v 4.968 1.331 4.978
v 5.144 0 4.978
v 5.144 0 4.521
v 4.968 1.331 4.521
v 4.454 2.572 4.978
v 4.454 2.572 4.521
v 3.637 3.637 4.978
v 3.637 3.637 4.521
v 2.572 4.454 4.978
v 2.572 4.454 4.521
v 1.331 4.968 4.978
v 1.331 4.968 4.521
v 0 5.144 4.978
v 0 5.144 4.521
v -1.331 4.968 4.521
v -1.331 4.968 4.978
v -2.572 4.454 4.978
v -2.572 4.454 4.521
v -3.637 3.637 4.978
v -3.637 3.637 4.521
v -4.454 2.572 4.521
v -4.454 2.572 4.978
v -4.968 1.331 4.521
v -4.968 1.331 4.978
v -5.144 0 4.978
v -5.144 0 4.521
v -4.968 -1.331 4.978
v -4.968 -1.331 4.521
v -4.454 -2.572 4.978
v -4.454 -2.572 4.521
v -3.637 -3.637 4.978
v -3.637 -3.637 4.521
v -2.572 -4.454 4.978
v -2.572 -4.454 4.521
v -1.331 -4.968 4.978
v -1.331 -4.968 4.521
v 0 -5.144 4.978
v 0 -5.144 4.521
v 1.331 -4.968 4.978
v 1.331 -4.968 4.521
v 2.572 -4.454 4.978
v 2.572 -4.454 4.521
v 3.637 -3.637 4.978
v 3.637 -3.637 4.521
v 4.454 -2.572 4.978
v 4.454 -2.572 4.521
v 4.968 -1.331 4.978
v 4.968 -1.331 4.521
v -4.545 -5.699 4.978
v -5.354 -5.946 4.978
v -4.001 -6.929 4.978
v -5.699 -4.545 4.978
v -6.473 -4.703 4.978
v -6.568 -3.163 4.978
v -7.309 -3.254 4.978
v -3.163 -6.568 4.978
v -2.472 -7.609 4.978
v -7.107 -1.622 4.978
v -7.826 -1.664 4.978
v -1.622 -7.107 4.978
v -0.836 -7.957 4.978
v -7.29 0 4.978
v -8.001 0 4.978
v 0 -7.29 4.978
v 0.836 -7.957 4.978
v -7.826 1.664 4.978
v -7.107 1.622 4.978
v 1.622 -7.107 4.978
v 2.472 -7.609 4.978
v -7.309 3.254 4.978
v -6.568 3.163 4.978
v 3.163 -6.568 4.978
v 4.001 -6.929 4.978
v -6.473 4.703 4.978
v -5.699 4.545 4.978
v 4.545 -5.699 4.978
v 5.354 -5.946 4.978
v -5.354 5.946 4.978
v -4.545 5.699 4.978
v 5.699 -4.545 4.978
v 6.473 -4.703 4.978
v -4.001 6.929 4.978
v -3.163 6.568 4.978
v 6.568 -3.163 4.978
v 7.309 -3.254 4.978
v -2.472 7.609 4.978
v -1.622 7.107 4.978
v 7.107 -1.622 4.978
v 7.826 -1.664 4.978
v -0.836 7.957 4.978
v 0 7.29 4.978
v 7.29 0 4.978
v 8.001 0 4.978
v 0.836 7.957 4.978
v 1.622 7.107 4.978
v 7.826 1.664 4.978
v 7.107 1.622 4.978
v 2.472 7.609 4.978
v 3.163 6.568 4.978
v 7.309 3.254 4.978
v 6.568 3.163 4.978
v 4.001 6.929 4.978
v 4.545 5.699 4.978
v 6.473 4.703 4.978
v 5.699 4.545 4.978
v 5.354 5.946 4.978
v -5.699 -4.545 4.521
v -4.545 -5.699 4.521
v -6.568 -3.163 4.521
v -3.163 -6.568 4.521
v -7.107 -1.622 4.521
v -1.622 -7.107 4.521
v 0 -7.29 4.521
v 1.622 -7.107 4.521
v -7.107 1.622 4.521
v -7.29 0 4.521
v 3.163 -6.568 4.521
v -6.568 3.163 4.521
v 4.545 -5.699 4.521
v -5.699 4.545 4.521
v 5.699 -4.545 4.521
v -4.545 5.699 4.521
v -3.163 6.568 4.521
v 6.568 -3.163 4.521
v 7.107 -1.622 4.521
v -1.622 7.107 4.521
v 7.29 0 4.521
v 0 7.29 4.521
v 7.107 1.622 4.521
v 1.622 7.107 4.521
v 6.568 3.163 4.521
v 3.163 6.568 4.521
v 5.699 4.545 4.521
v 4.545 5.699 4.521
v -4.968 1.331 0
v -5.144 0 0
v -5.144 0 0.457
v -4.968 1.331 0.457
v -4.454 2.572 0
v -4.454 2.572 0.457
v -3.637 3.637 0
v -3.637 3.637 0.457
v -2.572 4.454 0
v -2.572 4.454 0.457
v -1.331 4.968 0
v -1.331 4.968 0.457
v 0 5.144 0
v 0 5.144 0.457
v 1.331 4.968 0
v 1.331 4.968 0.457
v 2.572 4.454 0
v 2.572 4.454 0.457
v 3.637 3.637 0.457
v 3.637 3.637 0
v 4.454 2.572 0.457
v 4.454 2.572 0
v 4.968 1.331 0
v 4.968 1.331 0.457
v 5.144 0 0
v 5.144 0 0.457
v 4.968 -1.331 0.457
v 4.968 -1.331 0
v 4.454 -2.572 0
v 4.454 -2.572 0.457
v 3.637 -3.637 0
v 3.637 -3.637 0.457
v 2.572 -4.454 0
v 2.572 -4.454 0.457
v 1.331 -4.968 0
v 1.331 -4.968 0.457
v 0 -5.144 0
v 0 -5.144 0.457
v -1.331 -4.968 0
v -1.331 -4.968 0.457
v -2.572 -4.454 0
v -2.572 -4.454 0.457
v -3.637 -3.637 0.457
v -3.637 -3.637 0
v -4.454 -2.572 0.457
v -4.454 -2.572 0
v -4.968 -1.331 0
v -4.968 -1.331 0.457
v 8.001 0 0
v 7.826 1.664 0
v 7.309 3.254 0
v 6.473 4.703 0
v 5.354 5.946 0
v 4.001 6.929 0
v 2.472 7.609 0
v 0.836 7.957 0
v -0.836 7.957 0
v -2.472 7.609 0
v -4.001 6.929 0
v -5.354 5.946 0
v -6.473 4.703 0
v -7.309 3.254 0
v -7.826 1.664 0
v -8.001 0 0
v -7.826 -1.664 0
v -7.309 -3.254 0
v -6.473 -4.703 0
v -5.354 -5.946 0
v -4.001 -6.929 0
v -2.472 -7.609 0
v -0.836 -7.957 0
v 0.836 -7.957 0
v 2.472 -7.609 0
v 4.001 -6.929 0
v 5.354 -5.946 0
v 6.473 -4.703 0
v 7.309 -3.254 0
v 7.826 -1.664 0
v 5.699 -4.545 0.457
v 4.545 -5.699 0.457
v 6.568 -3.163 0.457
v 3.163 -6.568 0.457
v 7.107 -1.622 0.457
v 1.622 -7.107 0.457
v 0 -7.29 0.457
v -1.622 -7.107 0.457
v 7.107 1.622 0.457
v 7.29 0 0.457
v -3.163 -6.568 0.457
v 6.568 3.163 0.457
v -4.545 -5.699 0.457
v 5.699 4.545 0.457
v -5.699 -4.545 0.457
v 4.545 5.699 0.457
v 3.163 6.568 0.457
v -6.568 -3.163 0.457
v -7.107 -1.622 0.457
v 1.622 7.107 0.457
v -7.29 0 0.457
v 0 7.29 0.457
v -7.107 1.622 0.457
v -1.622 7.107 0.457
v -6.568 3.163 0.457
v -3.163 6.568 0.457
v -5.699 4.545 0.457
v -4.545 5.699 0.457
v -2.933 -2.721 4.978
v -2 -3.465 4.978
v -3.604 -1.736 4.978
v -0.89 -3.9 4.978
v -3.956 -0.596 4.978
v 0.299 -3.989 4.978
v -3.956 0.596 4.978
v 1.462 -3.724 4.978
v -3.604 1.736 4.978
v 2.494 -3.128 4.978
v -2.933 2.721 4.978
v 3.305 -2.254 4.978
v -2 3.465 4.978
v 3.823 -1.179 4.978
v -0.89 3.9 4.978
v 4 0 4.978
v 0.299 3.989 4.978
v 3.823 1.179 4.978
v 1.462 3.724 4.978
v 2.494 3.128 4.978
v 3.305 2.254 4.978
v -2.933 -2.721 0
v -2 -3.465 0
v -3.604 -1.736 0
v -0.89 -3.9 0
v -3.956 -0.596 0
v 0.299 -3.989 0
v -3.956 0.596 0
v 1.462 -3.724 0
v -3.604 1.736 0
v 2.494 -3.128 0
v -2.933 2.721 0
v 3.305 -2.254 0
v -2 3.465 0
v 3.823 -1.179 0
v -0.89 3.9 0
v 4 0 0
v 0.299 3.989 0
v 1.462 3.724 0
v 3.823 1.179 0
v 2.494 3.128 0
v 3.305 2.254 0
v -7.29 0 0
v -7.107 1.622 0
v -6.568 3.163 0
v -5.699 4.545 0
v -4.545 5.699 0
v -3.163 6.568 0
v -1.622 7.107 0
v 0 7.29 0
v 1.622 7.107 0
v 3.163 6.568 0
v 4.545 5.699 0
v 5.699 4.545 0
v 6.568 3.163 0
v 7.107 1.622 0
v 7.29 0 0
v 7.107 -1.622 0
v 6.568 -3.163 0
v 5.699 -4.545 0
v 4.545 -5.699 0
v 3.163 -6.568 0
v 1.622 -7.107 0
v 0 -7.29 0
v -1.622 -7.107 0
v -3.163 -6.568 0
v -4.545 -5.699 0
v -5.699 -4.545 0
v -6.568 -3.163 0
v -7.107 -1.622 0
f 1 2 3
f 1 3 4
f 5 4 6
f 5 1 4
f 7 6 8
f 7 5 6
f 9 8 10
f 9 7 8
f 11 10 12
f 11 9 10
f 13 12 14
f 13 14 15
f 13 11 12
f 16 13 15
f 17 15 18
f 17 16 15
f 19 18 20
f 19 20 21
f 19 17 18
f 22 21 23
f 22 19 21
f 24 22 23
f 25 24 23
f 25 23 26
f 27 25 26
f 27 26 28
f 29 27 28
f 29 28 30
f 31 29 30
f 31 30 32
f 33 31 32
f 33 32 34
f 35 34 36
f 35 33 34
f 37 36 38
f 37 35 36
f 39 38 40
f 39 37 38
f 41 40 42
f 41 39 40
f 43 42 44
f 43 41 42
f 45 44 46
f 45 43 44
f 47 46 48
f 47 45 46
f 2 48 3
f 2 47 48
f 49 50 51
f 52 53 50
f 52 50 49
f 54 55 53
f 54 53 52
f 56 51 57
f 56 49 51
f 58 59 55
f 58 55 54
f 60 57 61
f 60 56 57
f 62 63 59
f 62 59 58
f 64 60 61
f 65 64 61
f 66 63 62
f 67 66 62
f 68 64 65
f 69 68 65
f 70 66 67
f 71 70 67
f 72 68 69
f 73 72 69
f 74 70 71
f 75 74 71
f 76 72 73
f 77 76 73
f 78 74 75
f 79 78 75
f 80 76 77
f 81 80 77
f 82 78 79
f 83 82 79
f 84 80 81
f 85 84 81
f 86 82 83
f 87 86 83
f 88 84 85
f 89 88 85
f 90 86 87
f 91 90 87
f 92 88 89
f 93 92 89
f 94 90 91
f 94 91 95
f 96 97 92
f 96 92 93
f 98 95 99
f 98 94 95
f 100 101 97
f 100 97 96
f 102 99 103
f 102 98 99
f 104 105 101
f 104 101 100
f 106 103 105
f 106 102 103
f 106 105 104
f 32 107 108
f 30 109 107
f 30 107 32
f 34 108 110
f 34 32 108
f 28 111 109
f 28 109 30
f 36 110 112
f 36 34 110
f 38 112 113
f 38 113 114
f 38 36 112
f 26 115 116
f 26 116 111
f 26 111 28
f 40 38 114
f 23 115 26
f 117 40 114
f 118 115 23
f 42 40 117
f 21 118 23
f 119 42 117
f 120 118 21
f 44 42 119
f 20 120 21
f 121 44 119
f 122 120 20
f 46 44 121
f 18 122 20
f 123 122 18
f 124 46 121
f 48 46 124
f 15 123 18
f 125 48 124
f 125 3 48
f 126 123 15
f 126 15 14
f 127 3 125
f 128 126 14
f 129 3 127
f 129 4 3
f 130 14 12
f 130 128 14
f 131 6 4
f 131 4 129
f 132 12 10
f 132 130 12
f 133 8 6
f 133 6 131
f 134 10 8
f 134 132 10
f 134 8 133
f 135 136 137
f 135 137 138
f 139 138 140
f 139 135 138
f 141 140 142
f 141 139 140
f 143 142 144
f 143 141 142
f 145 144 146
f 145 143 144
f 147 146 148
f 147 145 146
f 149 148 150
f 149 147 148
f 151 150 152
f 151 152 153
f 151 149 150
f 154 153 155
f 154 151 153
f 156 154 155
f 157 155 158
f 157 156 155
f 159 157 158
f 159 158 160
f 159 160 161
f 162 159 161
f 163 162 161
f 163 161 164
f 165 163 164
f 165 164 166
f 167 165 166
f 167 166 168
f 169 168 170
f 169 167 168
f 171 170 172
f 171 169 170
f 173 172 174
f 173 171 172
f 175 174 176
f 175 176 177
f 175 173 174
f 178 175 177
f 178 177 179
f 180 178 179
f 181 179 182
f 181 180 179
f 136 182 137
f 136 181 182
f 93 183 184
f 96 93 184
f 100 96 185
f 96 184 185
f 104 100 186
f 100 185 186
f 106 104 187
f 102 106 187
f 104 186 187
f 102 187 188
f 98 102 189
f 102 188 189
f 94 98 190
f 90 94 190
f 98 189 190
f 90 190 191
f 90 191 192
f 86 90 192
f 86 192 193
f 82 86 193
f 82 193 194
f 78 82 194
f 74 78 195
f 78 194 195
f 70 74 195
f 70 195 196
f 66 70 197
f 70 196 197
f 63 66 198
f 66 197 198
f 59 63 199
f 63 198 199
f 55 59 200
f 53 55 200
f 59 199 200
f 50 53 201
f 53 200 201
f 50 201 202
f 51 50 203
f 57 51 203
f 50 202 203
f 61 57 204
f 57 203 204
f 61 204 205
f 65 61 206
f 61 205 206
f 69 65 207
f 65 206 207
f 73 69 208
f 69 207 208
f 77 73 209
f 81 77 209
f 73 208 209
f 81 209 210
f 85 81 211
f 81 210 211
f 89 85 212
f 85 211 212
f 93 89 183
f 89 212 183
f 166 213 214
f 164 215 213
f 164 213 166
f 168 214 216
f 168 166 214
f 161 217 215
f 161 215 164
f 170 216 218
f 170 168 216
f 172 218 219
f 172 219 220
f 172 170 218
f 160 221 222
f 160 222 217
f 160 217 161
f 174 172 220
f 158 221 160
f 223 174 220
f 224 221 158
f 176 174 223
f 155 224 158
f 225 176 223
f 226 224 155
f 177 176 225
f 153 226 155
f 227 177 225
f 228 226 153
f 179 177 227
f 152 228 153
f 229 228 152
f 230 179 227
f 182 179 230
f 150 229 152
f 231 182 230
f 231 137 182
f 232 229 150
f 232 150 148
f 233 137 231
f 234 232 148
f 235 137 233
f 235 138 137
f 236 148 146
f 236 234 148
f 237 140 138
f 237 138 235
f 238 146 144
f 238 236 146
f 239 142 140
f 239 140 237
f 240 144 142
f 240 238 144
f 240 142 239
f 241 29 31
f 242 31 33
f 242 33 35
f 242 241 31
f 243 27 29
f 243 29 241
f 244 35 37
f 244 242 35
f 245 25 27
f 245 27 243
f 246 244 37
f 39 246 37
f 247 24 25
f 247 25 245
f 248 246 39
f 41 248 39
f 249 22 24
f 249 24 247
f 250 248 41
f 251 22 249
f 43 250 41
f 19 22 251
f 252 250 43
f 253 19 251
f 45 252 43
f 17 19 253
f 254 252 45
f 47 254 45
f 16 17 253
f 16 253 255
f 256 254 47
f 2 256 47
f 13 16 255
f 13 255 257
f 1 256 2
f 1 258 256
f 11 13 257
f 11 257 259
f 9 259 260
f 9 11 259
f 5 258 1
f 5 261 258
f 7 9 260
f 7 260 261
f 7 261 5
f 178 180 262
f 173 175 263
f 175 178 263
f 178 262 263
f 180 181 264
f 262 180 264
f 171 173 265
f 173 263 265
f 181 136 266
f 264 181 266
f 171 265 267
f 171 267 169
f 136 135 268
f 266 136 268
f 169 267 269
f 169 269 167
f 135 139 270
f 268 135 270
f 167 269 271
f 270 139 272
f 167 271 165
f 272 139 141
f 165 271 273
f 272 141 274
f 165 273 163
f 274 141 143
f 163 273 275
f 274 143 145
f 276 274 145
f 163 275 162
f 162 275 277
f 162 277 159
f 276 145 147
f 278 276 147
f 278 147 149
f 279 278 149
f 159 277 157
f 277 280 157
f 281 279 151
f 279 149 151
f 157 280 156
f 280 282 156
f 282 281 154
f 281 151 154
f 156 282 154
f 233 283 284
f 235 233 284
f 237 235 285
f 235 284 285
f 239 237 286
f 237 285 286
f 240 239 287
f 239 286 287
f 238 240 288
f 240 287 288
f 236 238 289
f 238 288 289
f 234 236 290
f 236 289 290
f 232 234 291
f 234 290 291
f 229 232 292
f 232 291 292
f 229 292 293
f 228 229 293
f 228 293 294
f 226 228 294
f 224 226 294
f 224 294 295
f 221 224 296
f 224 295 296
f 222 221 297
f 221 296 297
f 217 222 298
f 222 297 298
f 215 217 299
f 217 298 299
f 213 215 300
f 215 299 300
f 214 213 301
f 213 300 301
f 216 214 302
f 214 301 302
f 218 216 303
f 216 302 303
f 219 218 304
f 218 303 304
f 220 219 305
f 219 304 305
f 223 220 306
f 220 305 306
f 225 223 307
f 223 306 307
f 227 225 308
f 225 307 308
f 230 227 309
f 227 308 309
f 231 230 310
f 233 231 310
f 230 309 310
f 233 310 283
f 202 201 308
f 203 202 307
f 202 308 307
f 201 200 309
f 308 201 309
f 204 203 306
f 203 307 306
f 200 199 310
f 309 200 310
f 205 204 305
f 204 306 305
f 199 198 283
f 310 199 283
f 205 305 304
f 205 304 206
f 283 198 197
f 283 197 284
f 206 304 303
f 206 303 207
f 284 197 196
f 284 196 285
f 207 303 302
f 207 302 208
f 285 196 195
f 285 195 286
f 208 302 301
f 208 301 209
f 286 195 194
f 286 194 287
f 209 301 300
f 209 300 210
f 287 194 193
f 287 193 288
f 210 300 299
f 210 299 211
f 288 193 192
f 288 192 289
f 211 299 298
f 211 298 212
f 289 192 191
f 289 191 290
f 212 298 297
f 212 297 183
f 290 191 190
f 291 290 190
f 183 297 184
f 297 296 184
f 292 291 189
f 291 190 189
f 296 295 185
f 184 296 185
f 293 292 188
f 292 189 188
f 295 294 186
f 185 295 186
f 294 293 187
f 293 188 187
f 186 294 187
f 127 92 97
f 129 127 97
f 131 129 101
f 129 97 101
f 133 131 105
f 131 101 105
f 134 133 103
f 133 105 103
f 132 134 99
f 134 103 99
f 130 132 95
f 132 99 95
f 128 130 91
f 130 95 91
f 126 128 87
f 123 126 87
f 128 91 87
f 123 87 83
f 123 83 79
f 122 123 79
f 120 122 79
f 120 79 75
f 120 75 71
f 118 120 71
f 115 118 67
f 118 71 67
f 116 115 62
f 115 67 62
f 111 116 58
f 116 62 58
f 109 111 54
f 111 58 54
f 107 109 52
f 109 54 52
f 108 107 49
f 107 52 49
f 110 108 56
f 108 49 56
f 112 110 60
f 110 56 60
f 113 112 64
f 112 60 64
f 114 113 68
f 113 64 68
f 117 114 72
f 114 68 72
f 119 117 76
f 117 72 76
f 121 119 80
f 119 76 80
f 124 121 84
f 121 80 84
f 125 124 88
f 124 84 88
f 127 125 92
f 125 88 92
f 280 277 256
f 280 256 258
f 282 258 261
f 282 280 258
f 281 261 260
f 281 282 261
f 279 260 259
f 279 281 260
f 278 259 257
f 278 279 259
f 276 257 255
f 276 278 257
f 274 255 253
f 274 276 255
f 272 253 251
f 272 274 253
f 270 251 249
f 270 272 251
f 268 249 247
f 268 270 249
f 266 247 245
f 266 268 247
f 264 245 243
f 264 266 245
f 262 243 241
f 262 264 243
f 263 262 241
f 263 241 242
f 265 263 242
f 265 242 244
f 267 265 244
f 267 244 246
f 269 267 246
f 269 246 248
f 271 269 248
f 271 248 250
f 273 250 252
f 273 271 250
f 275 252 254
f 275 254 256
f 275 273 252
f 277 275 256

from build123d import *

# Parameters (mm, degrees)
SKETCH1_R           = 8.001
SKETCH1_R_2         = 4.0005
BOSS_EXTRUDE1_DEPTH = 4.9784
SKETCH2_R           = 7.2898
SKETCH2_R_2         = 5.1435
CUT_EXTRUDE1_DEPTH  = 0.4572
CUT_EXTRUDE2_START  = -0.4572
SKETCH3_R           = 7.2898
SKETCH3_R_2         = 5.1435
CUT_EXTRUDE2_DEPTH  = 0.4572


with BuildPart() as part:
    # Sketch1 → Boss-Extrude1 (new body)
    with BuildSketch(Plane.XY):
        Circle(SKETCH1_R)
        Circle(SKETCH1_R_2, mode=Mode.SUBTRACT)
    extrude(amount=BOSS_EXTRUDE1_DEPTH)

    # Sketch2 → Cut-Extrude1 (cut)
    with BuildSketch(Plane.XY.offset(4.9784)):
        Circle(SKETCH2_R)
        Circle(SKETCH2_R_2, mode=Mode.SUBTRACT)
    extrude(amount=-CUT_EXTRUDE1_DEPTH, mode=Mode.SUBTRACT)

    # Sketch3 → Cut-Extrude2 (cut)
    with BuildSketch(Plane(origin=(0, 0, 0), x_dir=(-1, 0, 0), z_dir=(0, 0, -1)).offset(CUT_EXTRUDE2_START)):
        Circle(SKETCH3_R)
        Circle(SKETCH3_R_2, mode=Mode.SUBTRACT)
    extrude(amount=CUT_EXTRUDE2_DEPTH, mode=Mode.SUBTRACT)


solid = part.part
